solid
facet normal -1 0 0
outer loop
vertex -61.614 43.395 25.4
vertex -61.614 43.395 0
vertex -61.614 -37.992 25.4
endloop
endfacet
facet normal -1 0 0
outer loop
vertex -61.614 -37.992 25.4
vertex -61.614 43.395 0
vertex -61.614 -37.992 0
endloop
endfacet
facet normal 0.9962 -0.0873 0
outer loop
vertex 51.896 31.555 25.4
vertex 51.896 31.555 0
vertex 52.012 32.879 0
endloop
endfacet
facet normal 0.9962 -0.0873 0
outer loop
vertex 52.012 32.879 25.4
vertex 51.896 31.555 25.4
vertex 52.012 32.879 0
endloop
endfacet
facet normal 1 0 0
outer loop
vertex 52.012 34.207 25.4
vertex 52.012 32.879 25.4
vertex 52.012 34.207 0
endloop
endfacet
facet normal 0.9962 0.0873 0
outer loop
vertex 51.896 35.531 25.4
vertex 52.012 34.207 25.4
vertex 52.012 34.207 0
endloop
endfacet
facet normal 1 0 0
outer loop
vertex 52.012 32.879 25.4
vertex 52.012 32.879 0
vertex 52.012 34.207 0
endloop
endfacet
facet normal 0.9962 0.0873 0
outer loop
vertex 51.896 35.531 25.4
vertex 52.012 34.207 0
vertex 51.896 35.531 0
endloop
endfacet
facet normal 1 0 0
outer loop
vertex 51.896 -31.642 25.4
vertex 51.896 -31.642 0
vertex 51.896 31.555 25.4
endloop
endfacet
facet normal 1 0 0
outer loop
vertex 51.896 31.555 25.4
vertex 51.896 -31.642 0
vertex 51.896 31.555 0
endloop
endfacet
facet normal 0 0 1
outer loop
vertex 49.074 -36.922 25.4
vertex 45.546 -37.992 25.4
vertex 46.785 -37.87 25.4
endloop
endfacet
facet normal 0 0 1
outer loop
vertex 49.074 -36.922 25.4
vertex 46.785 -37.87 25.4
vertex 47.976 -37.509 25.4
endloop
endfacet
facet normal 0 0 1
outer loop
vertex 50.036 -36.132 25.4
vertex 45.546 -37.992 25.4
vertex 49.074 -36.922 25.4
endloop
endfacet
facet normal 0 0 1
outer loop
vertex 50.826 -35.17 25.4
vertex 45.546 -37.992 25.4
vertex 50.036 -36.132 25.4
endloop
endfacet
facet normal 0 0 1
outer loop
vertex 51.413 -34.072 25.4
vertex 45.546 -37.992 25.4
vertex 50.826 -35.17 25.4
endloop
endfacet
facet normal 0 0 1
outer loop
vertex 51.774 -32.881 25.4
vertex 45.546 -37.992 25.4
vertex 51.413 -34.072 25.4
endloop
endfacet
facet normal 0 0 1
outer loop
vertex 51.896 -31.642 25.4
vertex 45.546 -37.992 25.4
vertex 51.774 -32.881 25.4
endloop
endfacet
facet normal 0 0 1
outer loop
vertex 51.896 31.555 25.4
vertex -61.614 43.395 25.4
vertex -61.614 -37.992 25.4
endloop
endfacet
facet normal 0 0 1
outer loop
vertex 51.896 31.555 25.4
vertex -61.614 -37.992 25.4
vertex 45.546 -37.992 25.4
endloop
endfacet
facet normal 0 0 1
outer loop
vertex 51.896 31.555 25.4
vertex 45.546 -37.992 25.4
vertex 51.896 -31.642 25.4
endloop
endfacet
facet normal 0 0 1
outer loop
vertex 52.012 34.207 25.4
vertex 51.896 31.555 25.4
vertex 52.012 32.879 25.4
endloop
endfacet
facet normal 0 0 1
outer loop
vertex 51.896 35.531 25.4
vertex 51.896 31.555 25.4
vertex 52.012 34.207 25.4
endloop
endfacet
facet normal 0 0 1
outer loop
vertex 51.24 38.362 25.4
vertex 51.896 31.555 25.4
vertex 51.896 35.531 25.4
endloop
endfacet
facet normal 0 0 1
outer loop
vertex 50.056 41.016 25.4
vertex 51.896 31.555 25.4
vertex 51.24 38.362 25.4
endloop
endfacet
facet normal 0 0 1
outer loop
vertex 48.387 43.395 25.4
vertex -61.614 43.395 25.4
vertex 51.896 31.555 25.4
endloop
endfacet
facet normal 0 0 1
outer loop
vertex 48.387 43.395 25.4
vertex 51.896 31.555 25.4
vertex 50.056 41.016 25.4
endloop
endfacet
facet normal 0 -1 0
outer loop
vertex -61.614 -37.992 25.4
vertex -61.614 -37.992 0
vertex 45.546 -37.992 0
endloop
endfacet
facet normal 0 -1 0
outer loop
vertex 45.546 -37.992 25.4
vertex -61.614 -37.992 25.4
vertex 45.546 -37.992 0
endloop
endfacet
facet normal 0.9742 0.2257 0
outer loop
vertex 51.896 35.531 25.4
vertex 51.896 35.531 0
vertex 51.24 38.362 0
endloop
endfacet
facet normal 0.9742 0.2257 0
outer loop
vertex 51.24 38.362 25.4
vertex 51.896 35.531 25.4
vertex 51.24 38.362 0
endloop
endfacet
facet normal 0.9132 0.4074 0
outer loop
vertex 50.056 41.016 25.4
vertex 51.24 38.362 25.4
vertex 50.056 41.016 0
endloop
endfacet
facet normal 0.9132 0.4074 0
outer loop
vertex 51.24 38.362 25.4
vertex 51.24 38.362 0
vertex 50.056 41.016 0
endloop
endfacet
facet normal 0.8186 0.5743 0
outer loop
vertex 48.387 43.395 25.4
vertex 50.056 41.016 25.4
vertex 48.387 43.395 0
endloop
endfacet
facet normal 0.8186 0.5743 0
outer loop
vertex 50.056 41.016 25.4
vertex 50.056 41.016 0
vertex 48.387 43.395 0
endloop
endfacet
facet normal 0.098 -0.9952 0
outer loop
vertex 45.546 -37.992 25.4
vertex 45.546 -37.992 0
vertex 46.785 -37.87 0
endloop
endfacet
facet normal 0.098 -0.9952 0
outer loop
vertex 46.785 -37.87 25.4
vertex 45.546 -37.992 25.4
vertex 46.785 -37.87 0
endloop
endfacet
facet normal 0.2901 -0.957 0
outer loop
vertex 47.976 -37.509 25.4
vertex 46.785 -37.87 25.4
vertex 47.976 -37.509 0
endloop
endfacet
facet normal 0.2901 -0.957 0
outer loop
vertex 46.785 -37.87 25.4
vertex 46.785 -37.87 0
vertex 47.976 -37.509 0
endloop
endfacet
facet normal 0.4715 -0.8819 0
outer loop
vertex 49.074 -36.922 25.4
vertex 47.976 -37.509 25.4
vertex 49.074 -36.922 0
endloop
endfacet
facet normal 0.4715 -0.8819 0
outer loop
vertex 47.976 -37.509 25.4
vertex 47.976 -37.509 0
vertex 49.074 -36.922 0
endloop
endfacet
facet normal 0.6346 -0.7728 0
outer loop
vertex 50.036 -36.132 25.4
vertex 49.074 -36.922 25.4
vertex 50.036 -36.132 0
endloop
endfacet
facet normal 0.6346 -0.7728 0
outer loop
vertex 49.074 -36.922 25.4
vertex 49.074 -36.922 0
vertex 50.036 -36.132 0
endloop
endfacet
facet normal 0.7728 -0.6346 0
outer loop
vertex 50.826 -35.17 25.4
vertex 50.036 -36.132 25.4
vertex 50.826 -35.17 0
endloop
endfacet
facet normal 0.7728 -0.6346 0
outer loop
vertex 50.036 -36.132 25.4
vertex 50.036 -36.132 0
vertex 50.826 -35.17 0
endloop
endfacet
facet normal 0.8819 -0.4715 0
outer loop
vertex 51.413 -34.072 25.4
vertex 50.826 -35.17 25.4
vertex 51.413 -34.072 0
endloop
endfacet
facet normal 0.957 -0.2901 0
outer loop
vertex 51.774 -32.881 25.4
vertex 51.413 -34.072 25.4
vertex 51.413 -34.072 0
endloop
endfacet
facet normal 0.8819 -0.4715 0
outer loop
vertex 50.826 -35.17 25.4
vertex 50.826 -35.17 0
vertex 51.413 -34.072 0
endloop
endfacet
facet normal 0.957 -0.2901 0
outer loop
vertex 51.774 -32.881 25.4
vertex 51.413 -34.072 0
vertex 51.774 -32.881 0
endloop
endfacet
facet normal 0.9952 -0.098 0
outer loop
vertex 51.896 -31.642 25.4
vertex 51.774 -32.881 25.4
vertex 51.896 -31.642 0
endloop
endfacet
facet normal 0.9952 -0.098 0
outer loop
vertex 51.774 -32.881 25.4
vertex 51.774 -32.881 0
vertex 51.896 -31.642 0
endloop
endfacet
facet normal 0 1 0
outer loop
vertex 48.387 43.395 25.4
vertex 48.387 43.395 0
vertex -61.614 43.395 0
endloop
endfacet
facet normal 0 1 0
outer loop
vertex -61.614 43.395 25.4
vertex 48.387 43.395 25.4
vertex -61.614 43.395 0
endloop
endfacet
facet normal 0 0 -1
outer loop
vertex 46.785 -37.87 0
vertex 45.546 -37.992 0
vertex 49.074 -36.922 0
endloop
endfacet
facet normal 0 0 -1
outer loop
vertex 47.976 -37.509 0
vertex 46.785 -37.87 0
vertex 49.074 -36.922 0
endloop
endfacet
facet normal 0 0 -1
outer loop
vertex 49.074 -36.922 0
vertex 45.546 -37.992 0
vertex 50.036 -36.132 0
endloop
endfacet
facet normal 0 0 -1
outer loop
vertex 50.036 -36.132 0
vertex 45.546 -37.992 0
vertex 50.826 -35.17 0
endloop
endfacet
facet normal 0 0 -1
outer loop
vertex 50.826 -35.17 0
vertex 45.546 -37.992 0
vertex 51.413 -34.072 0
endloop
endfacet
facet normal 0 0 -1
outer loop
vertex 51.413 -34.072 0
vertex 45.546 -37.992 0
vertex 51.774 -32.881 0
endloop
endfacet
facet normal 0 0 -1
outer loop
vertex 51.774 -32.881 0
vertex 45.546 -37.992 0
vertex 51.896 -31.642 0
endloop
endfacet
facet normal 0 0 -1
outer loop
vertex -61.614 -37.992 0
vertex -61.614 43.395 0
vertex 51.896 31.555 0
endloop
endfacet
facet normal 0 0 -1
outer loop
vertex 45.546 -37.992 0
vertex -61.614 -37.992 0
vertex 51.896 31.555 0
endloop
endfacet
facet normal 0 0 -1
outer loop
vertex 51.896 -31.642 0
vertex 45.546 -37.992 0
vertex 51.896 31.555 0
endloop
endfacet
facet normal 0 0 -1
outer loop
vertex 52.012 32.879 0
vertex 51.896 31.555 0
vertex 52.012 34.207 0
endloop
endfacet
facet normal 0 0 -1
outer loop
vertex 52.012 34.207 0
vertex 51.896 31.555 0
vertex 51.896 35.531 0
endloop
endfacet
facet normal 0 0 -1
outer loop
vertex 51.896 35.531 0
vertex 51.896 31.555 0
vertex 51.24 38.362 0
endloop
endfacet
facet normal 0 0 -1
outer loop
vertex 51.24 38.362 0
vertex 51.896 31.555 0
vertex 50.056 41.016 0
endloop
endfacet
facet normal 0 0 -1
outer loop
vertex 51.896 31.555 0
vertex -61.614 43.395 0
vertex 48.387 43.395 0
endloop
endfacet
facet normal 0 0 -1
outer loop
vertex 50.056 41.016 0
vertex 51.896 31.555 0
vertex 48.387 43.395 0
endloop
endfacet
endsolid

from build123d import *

# Parameters (mm, degrees)
F1_DEPTH = 25.4


with BuildPart() as f1:
    # F0 (on Top) → F1 (new body)
    with BuildSketch(Plane.XY):
        with BuildLine():
            Line((25.366824, 43.394551), (-61.614241, 43.394551))
            Line((-61.614241, 43.394551), (-61.614241, -37.99203))
            Line((-61.614241, -37.99203), (45.545957, -37.99203))
            ThreePointArc((45.545957, -37.99203), (50.036086, -36.132158), (51.895957, -31.64203))
            Line((51.895957, -31.64203), (51.895957, 31.554978))
            ThreePointArc((51.895957, 31.554978), (30.702339, 19.708002), (25.366824, 43.394551))
        make_face()
        with BuildLine():
            Line((48.386586, 43.394551), (25.366824, 43.394551))
            ThreePointArc((25.366824, 43.394551), (30.702339, 19.708002), (51.895957, 31.554978))
            Line((51.895957, 31.554978), (51.895957, 35.531041))
            ThreePointArc((51.895957, 35.531041), (50.711712, 39.717375), (48.386586, 43.394551))
        make_face()
        with BuildLine():
            Line((51.895957, 35.531041), (51.895957, 31.554978))
            ThreePointArc((51.895957, 31.554978), (52.02696, 33.543009), (51.895957, 35.531041))
        make_face()
    extrude(amount=F1_DEPTH)


solid = f1.part
